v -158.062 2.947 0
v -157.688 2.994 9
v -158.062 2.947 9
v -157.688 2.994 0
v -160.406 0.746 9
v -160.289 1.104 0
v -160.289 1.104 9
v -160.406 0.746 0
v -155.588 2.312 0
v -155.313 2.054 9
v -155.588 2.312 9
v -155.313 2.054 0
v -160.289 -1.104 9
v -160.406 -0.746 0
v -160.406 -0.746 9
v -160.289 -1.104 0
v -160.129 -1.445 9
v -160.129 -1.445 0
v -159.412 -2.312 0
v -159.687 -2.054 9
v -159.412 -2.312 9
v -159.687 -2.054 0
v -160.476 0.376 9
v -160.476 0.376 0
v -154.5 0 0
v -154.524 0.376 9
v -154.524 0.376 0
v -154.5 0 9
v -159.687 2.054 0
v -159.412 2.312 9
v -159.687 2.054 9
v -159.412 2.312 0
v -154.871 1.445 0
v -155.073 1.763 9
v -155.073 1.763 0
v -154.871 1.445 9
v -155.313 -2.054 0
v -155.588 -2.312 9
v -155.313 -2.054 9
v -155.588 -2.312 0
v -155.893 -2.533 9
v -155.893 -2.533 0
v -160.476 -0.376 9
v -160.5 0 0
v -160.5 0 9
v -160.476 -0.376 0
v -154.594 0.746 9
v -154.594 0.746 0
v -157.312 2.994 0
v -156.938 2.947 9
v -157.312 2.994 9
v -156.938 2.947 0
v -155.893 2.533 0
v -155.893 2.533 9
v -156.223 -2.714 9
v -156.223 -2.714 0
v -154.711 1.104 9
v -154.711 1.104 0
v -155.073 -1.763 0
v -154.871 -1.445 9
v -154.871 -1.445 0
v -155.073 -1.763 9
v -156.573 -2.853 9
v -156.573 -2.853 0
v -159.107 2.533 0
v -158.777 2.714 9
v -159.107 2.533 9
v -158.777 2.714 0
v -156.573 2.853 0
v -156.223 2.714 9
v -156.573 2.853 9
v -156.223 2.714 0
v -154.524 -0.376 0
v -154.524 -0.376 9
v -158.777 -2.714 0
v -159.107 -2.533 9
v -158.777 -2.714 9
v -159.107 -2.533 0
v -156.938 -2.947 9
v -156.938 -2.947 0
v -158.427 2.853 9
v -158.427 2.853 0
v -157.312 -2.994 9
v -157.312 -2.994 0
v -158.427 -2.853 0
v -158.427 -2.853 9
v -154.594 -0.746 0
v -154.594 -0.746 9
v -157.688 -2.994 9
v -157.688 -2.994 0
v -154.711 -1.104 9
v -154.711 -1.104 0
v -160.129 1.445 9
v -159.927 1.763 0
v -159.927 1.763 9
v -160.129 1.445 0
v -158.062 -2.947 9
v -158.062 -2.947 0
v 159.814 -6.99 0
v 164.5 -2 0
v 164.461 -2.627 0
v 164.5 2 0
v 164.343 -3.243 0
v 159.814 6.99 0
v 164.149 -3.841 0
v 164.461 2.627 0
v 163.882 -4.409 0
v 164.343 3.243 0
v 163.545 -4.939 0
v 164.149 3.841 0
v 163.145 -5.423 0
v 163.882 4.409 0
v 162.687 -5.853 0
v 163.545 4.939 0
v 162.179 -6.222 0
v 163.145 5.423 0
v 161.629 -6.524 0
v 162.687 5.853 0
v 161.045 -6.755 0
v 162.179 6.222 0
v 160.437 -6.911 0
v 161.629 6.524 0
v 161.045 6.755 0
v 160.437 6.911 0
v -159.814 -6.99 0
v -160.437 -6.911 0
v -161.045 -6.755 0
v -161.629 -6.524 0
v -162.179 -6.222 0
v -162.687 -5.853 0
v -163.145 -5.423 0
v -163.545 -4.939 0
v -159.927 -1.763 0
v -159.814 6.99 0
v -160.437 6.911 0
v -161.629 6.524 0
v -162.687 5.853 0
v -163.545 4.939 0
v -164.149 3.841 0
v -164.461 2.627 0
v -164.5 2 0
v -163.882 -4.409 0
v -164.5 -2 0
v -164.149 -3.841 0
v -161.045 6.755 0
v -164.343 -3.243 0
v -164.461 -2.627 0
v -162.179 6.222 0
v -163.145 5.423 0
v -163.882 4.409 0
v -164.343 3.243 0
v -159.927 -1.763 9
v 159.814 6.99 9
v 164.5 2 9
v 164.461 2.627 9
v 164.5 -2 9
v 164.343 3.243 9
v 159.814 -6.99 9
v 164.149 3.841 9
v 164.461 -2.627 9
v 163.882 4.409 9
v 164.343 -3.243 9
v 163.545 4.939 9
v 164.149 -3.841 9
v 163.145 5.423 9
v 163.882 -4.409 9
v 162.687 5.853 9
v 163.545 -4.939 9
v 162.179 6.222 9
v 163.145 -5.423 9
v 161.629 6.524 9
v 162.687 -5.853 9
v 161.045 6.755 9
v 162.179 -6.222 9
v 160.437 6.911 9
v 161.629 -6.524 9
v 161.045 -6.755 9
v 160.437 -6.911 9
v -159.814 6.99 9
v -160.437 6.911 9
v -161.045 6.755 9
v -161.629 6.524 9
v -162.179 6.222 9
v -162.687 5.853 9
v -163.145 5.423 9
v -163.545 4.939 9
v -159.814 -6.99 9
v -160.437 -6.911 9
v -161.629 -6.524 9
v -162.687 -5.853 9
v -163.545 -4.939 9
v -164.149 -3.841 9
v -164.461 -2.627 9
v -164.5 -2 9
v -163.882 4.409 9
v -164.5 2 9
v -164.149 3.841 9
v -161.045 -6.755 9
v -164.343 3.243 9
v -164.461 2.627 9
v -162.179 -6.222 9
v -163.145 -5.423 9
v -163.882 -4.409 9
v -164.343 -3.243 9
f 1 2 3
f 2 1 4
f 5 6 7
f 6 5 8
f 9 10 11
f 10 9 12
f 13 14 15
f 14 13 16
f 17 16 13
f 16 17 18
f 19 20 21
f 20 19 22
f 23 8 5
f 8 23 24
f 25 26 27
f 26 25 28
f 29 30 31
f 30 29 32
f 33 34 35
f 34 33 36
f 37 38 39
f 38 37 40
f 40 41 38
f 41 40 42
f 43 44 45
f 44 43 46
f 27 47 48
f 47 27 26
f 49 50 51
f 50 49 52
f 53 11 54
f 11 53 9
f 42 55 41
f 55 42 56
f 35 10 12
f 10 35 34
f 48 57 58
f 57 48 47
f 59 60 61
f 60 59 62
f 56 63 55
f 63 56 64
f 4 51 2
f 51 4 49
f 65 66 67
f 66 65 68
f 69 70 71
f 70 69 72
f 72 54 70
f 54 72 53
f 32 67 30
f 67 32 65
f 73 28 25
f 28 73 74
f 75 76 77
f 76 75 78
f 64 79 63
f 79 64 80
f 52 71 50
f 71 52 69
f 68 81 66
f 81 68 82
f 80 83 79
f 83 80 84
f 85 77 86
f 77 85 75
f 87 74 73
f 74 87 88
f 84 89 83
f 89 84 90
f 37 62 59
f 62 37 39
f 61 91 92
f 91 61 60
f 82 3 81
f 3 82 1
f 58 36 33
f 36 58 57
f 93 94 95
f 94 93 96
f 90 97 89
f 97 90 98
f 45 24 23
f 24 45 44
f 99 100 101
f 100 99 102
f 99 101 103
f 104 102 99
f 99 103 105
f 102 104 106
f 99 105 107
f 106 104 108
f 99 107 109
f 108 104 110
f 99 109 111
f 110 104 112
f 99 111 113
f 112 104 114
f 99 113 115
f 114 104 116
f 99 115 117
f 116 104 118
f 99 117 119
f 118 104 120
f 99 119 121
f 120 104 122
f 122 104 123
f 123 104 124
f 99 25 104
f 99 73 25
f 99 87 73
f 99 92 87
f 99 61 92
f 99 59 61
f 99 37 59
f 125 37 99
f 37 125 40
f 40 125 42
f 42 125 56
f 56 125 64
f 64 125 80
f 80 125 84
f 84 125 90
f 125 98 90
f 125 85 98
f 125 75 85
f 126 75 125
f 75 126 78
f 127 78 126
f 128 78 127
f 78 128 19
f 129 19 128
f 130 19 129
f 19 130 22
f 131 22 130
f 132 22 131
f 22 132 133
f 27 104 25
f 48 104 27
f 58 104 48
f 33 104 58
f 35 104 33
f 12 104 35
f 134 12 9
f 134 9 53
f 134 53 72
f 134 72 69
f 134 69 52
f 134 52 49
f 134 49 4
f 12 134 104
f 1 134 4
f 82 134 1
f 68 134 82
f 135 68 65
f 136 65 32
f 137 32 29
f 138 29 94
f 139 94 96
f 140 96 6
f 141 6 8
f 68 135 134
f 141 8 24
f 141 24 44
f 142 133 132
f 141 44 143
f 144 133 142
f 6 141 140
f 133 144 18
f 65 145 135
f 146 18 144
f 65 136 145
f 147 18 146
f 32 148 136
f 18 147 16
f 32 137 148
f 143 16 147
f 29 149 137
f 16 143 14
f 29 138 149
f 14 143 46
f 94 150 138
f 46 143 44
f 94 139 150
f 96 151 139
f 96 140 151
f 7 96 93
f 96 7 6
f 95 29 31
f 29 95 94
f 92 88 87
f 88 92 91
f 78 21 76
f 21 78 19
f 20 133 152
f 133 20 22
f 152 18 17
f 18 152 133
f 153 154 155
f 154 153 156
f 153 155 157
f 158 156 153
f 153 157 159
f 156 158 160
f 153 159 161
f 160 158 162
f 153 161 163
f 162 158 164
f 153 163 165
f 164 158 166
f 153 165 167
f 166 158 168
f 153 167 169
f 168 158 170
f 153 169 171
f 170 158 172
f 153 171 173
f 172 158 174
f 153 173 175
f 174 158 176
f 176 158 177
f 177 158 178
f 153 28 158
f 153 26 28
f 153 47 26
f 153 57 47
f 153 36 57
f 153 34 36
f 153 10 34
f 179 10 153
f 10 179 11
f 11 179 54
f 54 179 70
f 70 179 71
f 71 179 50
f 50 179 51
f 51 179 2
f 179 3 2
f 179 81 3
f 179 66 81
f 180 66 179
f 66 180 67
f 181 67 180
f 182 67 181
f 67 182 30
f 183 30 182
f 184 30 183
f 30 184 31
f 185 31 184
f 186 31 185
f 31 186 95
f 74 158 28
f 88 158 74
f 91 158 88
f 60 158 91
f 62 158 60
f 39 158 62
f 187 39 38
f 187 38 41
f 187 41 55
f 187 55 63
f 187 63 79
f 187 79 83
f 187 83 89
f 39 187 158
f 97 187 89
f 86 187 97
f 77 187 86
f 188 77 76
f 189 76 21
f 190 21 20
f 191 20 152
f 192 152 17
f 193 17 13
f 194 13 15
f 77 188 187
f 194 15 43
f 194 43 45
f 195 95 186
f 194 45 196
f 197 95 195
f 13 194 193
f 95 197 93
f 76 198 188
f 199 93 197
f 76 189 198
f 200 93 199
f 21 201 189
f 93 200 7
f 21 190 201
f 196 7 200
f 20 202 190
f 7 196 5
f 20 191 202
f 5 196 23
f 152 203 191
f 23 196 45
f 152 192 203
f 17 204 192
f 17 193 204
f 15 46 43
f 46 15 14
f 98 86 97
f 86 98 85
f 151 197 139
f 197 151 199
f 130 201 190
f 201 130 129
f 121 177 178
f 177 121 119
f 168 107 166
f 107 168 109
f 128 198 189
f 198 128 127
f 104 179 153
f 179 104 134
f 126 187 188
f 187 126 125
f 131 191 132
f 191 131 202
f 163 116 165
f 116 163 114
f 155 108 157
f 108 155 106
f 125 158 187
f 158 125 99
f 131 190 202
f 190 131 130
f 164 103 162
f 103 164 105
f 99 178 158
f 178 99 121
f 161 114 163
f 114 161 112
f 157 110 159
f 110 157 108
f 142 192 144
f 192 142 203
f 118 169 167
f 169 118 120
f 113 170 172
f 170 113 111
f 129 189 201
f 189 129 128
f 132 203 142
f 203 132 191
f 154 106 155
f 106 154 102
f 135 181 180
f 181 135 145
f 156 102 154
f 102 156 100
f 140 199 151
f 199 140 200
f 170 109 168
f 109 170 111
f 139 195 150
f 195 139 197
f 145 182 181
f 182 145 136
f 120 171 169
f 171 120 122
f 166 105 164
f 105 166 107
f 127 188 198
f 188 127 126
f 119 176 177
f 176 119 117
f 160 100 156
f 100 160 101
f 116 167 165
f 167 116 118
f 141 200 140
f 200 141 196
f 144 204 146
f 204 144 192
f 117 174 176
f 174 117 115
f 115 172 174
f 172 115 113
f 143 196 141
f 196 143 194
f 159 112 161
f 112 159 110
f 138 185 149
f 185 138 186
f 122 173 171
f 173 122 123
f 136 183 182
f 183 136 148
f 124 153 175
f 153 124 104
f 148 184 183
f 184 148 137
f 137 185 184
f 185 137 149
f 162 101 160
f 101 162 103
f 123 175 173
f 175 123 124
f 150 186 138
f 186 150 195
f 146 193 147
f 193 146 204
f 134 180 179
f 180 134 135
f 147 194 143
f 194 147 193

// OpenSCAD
$fn = 50;


difference() {
	union() {
		hull() {
			translate(v = [-159.5000000000, 2.0000000000, 0]) {
				cylinder(h = 9, r = 5);
			}
			translate(v = [159.5000000000, 2.0000000000, 0]) {
				cylinder(h = 9, r = 5);
			}
			translate(v = [-159.5000000000, -2.0000000000, 0]) {
				cylinder(h = 9, r = 5);
			}
			translate(v = [159.5000000000, -2.0000000000, 0]) {
				cylinder(h = 9, r = 5);
			}
		}
	}
	union() {
		translate(v = [-157.5000000000, 0.0000000000, 0]) {
			cylinder(h = 9, r = 3.0000000000);
		}
		translate(v = [-157.5000000000, 0.0000000000, 0]) {
			cylinder(h = 9, r = 1.5000000000);
		}
		translate(v = [-157.5000000000, 0.0000000000, 0]) {
			cylinder(h = 9, r = 1.5000000000);
		}
		translate(v = [-157.5000000000, 0.0000000000, 0]) {
			cylinder(h = 9, r = 1.5000000000);
		}
	}
}
